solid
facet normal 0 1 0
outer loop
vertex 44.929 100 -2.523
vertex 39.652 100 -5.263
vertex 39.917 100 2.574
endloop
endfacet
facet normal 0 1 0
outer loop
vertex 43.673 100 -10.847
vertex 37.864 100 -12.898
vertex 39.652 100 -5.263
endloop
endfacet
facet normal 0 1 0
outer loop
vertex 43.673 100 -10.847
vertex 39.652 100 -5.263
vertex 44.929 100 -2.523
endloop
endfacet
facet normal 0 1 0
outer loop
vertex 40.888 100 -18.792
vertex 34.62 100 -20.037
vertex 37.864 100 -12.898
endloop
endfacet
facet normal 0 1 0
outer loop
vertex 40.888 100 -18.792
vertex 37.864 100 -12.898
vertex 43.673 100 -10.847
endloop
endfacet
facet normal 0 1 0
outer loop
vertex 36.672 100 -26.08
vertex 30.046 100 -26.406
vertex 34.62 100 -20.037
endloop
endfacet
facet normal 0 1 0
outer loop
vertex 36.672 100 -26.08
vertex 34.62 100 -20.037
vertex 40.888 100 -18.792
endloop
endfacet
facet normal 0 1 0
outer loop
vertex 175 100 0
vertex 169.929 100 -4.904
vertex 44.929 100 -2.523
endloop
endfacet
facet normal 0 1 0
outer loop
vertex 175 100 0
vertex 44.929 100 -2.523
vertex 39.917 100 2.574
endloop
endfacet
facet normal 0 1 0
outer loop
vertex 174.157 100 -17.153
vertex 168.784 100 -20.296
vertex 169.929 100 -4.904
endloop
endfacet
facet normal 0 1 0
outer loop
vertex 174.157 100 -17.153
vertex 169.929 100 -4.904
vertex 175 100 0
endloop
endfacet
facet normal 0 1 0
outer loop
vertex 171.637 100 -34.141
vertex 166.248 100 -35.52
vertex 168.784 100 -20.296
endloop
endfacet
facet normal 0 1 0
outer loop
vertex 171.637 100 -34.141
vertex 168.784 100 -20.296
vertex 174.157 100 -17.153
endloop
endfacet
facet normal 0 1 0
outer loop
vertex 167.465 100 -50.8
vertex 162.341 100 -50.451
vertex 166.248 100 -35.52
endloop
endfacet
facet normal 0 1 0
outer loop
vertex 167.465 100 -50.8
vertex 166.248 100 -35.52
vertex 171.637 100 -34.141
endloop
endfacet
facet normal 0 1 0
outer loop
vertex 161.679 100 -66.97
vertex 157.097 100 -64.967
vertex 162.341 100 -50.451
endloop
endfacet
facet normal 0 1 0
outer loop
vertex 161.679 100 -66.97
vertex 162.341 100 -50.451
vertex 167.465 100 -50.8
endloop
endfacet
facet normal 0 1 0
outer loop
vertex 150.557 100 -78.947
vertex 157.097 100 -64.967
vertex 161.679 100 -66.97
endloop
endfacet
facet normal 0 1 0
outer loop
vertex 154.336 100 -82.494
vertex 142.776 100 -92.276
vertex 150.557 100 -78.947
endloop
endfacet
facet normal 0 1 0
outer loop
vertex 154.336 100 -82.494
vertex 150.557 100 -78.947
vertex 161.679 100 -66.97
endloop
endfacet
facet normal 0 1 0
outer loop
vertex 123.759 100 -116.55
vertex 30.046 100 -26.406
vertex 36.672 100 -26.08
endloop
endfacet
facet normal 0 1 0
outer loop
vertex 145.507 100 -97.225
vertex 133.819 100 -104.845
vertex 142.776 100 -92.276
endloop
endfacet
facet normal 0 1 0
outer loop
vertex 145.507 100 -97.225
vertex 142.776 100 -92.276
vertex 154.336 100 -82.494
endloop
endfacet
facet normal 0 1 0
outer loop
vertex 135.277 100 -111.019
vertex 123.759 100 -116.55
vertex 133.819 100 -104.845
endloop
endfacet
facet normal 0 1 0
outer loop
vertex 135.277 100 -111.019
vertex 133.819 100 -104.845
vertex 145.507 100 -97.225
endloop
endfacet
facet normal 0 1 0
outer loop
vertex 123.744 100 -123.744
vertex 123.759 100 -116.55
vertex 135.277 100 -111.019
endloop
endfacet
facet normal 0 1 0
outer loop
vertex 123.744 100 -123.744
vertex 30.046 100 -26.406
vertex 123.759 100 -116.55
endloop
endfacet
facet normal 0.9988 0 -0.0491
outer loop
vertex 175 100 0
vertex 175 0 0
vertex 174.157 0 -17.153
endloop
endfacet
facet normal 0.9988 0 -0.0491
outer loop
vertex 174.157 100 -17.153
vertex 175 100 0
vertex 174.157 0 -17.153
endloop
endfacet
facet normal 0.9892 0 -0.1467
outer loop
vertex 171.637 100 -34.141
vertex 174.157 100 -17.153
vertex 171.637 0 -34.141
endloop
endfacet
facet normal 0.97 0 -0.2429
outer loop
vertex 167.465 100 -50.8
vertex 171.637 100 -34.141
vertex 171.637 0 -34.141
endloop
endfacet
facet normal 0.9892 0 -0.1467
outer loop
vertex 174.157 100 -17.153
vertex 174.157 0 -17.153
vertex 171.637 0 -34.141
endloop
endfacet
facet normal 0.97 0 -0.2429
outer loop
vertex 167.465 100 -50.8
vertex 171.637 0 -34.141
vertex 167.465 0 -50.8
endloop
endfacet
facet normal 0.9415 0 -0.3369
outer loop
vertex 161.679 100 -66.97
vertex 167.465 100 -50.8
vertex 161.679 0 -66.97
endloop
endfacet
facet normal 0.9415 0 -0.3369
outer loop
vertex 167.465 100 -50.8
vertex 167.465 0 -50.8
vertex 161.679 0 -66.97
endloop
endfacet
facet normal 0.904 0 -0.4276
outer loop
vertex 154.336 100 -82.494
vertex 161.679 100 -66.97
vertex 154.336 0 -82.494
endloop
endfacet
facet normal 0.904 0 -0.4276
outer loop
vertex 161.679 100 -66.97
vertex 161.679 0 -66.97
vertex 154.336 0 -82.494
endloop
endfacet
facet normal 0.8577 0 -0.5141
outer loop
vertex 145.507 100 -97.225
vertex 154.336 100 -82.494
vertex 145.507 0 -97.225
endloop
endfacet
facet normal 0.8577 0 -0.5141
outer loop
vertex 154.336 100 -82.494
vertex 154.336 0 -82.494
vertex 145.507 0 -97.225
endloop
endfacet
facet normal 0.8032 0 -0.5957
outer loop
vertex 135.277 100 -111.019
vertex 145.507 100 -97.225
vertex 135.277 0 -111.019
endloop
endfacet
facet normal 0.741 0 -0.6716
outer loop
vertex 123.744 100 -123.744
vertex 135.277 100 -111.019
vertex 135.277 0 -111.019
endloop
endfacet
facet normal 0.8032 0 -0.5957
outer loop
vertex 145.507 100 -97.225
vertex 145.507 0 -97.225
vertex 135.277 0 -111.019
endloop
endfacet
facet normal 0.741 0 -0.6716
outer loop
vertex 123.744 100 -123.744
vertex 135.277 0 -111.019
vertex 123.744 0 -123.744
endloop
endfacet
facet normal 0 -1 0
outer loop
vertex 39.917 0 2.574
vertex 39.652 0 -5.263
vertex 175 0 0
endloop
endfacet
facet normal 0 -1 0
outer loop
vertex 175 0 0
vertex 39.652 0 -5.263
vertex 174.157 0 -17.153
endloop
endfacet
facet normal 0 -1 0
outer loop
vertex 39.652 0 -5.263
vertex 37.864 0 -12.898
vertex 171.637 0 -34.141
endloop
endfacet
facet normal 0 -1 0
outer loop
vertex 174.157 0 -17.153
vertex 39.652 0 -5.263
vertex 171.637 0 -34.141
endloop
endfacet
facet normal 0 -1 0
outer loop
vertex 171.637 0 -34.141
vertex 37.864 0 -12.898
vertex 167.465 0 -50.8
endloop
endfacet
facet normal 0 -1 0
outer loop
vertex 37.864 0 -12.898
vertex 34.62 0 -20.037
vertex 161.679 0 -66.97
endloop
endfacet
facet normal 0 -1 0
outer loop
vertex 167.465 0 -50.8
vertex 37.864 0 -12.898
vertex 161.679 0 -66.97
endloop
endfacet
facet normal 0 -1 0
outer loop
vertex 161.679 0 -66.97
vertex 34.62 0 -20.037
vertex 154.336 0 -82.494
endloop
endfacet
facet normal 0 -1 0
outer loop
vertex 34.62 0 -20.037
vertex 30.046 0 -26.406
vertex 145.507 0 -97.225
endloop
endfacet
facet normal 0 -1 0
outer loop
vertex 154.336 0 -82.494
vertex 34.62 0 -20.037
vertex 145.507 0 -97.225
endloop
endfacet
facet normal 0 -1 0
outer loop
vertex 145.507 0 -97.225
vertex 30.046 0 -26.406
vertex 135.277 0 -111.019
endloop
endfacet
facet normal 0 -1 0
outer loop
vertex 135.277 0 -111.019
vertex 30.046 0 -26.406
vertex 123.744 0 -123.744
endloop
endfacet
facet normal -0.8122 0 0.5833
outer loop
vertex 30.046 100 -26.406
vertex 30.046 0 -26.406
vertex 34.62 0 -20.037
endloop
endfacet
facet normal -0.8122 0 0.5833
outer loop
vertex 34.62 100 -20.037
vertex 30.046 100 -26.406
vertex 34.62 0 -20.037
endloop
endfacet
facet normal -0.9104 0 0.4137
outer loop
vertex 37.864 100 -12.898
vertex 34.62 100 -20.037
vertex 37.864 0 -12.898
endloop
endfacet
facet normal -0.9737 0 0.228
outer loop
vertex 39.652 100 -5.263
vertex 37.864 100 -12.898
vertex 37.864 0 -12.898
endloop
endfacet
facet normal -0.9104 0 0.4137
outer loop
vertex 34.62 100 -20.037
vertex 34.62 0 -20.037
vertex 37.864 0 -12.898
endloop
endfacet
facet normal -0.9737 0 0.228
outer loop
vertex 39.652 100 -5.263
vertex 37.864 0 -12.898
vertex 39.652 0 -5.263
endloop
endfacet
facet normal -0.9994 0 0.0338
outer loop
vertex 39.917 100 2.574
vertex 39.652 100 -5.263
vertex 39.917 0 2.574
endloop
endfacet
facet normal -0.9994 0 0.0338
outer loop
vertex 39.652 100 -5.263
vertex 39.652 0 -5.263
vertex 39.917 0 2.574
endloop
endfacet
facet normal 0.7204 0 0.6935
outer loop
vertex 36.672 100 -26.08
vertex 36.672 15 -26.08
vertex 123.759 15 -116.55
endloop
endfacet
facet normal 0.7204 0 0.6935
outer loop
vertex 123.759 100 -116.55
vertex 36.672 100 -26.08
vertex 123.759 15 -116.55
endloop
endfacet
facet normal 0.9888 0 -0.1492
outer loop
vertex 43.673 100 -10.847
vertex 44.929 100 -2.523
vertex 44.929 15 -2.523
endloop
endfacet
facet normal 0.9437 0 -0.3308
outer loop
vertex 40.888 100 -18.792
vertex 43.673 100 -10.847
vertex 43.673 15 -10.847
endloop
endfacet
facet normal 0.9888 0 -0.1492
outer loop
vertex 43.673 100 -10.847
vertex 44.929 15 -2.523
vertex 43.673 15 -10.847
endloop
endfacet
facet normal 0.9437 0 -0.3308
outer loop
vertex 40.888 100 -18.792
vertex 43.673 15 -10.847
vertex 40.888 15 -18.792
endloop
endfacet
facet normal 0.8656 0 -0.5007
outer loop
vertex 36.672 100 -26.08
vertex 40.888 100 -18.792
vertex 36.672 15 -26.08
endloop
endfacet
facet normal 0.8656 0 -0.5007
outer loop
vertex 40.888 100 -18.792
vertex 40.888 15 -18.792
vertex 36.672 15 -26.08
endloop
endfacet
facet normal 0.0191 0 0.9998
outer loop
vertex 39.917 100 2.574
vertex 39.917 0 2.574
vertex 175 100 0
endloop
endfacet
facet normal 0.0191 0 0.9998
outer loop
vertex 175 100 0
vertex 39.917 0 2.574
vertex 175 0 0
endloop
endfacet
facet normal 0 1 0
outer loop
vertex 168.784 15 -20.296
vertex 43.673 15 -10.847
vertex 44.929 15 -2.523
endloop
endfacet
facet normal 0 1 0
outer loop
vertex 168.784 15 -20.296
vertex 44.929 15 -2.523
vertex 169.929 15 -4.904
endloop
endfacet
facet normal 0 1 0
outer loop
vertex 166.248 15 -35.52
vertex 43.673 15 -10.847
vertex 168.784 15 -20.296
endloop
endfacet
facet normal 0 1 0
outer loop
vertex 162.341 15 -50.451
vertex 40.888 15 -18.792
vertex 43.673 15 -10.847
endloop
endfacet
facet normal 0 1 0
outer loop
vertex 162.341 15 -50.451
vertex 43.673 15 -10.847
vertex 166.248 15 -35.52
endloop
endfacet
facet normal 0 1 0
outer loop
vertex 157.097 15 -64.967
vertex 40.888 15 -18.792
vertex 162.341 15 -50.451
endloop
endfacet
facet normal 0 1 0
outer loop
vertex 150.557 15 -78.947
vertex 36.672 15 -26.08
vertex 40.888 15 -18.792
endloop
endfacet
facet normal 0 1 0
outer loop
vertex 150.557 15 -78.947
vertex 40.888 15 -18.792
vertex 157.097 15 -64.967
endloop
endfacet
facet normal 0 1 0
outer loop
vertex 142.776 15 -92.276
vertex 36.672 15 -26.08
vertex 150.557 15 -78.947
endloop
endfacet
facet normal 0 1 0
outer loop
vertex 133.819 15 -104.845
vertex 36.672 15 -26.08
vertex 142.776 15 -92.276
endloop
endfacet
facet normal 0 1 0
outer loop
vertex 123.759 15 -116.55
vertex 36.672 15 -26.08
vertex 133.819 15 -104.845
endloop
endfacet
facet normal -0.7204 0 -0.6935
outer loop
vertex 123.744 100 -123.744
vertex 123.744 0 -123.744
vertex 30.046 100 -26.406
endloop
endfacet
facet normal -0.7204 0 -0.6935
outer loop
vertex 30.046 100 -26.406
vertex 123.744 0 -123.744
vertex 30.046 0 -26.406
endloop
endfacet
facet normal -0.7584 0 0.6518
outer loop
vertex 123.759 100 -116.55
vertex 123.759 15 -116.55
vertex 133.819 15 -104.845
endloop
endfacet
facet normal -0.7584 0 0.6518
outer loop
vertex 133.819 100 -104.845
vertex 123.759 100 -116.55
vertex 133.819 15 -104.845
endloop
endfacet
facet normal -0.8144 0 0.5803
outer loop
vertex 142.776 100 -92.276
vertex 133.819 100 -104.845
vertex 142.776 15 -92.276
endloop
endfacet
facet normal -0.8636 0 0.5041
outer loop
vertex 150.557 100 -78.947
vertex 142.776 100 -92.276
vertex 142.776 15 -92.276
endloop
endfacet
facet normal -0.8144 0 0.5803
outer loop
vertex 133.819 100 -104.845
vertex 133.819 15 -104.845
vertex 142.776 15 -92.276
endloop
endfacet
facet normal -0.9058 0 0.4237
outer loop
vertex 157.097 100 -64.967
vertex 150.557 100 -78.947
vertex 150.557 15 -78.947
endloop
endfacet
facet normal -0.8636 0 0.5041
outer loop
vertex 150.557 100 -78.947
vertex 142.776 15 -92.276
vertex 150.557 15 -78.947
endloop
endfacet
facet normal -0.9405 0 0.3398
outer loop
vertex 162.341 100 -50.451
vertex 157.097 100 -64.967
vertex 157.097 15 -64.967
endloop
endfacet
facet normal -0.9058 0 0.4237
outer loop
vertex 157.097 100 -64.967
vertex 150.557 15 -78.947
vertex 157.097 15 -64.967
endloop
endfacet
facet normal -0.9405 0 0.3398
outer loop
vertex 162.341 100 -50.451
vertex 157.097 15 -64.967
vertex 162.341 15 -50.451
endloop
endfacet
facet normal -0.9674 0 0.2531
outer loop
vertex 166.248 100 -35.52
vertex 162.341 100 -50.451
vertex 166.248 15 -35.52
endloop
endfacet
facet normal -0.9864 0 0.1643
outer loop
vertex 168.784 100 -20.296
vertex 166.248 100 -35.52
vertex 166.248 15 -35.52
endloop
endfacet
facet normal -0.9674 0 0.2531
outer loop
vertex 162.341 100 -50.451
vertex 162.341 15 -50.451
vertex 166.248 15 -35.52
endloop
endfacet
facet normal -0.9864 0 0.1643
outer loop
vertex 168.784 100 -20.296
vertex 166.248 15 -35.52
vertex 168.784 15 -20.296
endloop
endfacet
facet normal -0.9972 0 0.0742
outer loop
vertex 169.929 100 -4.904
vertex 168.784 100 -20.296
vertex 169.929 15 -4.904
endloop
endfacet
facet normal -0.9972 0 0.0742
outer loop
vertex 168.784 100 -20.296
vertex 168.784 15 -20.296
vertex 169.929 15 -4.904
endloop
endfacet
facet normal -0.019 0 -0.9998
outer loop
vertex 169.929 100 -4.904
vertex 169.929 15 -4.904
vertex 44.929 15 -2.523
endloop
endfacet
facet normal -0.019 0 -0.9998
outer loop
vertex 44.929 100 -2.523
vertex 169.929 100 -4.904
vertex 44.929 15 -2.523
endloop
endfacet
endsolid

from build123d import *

# Parameters (mm, degrees)
BOSS_EXTRUDE1_DEPTH = 100
BOSS_EXTRUDE3_DEPTH = 15


with BuildPart() as part:
    # Sketch3 → Boss-Extrude1 (new body)
    with BuildSketch(Plane(origin=(0, 0, 0), x_dir=(1, 0, 0), z_dir=(0, 1, 0))):
        with BuildLine():
            Line((123.743686708, 123.743686708), (30.045678616, 26.405628121))
            ThreePointArc((30.045678616, 26.405628121), (37.863583917, 12.897635944), (39.917101801, -2.573904389))
            Line((39.917101801, -2.573904389), (175, 0))
            ThreePointArc((175, 0), (161.678918189, 66.969600664), (123.743686708, 123.743686708))
        make_face()
        with BuildLine():
            Line((36.672129032, 26.079780525), (123.758669753, 116.549524499))
            ThreePointArc((123.758669753, 116.549524499), (157.096506553, 64.966819445), (169.929243976, 4.904288086))
            Line((169.929243976, 4.904288086), (44.929243976, 2.52250584))
            ThreePointArc((44.929243976, 2.52250584), (42.466837849, 14.885149752), (36.672129032, 26.079780525))
        make_face(mode=Mode.SUBTRACT)
    extrude(amount=BOSS_EXTRUDE1_DEPTH)

    # Sketch5 → Boss-Extrude3 (add)
    with BuildSketch(Plane(origin=(0, 0, 0), x_dir=(1, 0, 0), z_dir=(0, 1, 0))):
        with BuildLine():
            Line((39.917101801, -2.573904389), (175, 0))
            ThreePointArc((175, 0), (161.678918189, 66.969600664), (123.743686708, 123.743686708))
            Line((123.743686708, 123.743686708), (30.045678616, 26.405628121))
            ThreePointArc((30.045678616, 26.405628121), (37.863583917, 12.897635944), (39.917101801, -2.573904389))
        make_face()
    extrude(amount=BOSS_EXTRUDE3_DEPTH)


solid = part.part
